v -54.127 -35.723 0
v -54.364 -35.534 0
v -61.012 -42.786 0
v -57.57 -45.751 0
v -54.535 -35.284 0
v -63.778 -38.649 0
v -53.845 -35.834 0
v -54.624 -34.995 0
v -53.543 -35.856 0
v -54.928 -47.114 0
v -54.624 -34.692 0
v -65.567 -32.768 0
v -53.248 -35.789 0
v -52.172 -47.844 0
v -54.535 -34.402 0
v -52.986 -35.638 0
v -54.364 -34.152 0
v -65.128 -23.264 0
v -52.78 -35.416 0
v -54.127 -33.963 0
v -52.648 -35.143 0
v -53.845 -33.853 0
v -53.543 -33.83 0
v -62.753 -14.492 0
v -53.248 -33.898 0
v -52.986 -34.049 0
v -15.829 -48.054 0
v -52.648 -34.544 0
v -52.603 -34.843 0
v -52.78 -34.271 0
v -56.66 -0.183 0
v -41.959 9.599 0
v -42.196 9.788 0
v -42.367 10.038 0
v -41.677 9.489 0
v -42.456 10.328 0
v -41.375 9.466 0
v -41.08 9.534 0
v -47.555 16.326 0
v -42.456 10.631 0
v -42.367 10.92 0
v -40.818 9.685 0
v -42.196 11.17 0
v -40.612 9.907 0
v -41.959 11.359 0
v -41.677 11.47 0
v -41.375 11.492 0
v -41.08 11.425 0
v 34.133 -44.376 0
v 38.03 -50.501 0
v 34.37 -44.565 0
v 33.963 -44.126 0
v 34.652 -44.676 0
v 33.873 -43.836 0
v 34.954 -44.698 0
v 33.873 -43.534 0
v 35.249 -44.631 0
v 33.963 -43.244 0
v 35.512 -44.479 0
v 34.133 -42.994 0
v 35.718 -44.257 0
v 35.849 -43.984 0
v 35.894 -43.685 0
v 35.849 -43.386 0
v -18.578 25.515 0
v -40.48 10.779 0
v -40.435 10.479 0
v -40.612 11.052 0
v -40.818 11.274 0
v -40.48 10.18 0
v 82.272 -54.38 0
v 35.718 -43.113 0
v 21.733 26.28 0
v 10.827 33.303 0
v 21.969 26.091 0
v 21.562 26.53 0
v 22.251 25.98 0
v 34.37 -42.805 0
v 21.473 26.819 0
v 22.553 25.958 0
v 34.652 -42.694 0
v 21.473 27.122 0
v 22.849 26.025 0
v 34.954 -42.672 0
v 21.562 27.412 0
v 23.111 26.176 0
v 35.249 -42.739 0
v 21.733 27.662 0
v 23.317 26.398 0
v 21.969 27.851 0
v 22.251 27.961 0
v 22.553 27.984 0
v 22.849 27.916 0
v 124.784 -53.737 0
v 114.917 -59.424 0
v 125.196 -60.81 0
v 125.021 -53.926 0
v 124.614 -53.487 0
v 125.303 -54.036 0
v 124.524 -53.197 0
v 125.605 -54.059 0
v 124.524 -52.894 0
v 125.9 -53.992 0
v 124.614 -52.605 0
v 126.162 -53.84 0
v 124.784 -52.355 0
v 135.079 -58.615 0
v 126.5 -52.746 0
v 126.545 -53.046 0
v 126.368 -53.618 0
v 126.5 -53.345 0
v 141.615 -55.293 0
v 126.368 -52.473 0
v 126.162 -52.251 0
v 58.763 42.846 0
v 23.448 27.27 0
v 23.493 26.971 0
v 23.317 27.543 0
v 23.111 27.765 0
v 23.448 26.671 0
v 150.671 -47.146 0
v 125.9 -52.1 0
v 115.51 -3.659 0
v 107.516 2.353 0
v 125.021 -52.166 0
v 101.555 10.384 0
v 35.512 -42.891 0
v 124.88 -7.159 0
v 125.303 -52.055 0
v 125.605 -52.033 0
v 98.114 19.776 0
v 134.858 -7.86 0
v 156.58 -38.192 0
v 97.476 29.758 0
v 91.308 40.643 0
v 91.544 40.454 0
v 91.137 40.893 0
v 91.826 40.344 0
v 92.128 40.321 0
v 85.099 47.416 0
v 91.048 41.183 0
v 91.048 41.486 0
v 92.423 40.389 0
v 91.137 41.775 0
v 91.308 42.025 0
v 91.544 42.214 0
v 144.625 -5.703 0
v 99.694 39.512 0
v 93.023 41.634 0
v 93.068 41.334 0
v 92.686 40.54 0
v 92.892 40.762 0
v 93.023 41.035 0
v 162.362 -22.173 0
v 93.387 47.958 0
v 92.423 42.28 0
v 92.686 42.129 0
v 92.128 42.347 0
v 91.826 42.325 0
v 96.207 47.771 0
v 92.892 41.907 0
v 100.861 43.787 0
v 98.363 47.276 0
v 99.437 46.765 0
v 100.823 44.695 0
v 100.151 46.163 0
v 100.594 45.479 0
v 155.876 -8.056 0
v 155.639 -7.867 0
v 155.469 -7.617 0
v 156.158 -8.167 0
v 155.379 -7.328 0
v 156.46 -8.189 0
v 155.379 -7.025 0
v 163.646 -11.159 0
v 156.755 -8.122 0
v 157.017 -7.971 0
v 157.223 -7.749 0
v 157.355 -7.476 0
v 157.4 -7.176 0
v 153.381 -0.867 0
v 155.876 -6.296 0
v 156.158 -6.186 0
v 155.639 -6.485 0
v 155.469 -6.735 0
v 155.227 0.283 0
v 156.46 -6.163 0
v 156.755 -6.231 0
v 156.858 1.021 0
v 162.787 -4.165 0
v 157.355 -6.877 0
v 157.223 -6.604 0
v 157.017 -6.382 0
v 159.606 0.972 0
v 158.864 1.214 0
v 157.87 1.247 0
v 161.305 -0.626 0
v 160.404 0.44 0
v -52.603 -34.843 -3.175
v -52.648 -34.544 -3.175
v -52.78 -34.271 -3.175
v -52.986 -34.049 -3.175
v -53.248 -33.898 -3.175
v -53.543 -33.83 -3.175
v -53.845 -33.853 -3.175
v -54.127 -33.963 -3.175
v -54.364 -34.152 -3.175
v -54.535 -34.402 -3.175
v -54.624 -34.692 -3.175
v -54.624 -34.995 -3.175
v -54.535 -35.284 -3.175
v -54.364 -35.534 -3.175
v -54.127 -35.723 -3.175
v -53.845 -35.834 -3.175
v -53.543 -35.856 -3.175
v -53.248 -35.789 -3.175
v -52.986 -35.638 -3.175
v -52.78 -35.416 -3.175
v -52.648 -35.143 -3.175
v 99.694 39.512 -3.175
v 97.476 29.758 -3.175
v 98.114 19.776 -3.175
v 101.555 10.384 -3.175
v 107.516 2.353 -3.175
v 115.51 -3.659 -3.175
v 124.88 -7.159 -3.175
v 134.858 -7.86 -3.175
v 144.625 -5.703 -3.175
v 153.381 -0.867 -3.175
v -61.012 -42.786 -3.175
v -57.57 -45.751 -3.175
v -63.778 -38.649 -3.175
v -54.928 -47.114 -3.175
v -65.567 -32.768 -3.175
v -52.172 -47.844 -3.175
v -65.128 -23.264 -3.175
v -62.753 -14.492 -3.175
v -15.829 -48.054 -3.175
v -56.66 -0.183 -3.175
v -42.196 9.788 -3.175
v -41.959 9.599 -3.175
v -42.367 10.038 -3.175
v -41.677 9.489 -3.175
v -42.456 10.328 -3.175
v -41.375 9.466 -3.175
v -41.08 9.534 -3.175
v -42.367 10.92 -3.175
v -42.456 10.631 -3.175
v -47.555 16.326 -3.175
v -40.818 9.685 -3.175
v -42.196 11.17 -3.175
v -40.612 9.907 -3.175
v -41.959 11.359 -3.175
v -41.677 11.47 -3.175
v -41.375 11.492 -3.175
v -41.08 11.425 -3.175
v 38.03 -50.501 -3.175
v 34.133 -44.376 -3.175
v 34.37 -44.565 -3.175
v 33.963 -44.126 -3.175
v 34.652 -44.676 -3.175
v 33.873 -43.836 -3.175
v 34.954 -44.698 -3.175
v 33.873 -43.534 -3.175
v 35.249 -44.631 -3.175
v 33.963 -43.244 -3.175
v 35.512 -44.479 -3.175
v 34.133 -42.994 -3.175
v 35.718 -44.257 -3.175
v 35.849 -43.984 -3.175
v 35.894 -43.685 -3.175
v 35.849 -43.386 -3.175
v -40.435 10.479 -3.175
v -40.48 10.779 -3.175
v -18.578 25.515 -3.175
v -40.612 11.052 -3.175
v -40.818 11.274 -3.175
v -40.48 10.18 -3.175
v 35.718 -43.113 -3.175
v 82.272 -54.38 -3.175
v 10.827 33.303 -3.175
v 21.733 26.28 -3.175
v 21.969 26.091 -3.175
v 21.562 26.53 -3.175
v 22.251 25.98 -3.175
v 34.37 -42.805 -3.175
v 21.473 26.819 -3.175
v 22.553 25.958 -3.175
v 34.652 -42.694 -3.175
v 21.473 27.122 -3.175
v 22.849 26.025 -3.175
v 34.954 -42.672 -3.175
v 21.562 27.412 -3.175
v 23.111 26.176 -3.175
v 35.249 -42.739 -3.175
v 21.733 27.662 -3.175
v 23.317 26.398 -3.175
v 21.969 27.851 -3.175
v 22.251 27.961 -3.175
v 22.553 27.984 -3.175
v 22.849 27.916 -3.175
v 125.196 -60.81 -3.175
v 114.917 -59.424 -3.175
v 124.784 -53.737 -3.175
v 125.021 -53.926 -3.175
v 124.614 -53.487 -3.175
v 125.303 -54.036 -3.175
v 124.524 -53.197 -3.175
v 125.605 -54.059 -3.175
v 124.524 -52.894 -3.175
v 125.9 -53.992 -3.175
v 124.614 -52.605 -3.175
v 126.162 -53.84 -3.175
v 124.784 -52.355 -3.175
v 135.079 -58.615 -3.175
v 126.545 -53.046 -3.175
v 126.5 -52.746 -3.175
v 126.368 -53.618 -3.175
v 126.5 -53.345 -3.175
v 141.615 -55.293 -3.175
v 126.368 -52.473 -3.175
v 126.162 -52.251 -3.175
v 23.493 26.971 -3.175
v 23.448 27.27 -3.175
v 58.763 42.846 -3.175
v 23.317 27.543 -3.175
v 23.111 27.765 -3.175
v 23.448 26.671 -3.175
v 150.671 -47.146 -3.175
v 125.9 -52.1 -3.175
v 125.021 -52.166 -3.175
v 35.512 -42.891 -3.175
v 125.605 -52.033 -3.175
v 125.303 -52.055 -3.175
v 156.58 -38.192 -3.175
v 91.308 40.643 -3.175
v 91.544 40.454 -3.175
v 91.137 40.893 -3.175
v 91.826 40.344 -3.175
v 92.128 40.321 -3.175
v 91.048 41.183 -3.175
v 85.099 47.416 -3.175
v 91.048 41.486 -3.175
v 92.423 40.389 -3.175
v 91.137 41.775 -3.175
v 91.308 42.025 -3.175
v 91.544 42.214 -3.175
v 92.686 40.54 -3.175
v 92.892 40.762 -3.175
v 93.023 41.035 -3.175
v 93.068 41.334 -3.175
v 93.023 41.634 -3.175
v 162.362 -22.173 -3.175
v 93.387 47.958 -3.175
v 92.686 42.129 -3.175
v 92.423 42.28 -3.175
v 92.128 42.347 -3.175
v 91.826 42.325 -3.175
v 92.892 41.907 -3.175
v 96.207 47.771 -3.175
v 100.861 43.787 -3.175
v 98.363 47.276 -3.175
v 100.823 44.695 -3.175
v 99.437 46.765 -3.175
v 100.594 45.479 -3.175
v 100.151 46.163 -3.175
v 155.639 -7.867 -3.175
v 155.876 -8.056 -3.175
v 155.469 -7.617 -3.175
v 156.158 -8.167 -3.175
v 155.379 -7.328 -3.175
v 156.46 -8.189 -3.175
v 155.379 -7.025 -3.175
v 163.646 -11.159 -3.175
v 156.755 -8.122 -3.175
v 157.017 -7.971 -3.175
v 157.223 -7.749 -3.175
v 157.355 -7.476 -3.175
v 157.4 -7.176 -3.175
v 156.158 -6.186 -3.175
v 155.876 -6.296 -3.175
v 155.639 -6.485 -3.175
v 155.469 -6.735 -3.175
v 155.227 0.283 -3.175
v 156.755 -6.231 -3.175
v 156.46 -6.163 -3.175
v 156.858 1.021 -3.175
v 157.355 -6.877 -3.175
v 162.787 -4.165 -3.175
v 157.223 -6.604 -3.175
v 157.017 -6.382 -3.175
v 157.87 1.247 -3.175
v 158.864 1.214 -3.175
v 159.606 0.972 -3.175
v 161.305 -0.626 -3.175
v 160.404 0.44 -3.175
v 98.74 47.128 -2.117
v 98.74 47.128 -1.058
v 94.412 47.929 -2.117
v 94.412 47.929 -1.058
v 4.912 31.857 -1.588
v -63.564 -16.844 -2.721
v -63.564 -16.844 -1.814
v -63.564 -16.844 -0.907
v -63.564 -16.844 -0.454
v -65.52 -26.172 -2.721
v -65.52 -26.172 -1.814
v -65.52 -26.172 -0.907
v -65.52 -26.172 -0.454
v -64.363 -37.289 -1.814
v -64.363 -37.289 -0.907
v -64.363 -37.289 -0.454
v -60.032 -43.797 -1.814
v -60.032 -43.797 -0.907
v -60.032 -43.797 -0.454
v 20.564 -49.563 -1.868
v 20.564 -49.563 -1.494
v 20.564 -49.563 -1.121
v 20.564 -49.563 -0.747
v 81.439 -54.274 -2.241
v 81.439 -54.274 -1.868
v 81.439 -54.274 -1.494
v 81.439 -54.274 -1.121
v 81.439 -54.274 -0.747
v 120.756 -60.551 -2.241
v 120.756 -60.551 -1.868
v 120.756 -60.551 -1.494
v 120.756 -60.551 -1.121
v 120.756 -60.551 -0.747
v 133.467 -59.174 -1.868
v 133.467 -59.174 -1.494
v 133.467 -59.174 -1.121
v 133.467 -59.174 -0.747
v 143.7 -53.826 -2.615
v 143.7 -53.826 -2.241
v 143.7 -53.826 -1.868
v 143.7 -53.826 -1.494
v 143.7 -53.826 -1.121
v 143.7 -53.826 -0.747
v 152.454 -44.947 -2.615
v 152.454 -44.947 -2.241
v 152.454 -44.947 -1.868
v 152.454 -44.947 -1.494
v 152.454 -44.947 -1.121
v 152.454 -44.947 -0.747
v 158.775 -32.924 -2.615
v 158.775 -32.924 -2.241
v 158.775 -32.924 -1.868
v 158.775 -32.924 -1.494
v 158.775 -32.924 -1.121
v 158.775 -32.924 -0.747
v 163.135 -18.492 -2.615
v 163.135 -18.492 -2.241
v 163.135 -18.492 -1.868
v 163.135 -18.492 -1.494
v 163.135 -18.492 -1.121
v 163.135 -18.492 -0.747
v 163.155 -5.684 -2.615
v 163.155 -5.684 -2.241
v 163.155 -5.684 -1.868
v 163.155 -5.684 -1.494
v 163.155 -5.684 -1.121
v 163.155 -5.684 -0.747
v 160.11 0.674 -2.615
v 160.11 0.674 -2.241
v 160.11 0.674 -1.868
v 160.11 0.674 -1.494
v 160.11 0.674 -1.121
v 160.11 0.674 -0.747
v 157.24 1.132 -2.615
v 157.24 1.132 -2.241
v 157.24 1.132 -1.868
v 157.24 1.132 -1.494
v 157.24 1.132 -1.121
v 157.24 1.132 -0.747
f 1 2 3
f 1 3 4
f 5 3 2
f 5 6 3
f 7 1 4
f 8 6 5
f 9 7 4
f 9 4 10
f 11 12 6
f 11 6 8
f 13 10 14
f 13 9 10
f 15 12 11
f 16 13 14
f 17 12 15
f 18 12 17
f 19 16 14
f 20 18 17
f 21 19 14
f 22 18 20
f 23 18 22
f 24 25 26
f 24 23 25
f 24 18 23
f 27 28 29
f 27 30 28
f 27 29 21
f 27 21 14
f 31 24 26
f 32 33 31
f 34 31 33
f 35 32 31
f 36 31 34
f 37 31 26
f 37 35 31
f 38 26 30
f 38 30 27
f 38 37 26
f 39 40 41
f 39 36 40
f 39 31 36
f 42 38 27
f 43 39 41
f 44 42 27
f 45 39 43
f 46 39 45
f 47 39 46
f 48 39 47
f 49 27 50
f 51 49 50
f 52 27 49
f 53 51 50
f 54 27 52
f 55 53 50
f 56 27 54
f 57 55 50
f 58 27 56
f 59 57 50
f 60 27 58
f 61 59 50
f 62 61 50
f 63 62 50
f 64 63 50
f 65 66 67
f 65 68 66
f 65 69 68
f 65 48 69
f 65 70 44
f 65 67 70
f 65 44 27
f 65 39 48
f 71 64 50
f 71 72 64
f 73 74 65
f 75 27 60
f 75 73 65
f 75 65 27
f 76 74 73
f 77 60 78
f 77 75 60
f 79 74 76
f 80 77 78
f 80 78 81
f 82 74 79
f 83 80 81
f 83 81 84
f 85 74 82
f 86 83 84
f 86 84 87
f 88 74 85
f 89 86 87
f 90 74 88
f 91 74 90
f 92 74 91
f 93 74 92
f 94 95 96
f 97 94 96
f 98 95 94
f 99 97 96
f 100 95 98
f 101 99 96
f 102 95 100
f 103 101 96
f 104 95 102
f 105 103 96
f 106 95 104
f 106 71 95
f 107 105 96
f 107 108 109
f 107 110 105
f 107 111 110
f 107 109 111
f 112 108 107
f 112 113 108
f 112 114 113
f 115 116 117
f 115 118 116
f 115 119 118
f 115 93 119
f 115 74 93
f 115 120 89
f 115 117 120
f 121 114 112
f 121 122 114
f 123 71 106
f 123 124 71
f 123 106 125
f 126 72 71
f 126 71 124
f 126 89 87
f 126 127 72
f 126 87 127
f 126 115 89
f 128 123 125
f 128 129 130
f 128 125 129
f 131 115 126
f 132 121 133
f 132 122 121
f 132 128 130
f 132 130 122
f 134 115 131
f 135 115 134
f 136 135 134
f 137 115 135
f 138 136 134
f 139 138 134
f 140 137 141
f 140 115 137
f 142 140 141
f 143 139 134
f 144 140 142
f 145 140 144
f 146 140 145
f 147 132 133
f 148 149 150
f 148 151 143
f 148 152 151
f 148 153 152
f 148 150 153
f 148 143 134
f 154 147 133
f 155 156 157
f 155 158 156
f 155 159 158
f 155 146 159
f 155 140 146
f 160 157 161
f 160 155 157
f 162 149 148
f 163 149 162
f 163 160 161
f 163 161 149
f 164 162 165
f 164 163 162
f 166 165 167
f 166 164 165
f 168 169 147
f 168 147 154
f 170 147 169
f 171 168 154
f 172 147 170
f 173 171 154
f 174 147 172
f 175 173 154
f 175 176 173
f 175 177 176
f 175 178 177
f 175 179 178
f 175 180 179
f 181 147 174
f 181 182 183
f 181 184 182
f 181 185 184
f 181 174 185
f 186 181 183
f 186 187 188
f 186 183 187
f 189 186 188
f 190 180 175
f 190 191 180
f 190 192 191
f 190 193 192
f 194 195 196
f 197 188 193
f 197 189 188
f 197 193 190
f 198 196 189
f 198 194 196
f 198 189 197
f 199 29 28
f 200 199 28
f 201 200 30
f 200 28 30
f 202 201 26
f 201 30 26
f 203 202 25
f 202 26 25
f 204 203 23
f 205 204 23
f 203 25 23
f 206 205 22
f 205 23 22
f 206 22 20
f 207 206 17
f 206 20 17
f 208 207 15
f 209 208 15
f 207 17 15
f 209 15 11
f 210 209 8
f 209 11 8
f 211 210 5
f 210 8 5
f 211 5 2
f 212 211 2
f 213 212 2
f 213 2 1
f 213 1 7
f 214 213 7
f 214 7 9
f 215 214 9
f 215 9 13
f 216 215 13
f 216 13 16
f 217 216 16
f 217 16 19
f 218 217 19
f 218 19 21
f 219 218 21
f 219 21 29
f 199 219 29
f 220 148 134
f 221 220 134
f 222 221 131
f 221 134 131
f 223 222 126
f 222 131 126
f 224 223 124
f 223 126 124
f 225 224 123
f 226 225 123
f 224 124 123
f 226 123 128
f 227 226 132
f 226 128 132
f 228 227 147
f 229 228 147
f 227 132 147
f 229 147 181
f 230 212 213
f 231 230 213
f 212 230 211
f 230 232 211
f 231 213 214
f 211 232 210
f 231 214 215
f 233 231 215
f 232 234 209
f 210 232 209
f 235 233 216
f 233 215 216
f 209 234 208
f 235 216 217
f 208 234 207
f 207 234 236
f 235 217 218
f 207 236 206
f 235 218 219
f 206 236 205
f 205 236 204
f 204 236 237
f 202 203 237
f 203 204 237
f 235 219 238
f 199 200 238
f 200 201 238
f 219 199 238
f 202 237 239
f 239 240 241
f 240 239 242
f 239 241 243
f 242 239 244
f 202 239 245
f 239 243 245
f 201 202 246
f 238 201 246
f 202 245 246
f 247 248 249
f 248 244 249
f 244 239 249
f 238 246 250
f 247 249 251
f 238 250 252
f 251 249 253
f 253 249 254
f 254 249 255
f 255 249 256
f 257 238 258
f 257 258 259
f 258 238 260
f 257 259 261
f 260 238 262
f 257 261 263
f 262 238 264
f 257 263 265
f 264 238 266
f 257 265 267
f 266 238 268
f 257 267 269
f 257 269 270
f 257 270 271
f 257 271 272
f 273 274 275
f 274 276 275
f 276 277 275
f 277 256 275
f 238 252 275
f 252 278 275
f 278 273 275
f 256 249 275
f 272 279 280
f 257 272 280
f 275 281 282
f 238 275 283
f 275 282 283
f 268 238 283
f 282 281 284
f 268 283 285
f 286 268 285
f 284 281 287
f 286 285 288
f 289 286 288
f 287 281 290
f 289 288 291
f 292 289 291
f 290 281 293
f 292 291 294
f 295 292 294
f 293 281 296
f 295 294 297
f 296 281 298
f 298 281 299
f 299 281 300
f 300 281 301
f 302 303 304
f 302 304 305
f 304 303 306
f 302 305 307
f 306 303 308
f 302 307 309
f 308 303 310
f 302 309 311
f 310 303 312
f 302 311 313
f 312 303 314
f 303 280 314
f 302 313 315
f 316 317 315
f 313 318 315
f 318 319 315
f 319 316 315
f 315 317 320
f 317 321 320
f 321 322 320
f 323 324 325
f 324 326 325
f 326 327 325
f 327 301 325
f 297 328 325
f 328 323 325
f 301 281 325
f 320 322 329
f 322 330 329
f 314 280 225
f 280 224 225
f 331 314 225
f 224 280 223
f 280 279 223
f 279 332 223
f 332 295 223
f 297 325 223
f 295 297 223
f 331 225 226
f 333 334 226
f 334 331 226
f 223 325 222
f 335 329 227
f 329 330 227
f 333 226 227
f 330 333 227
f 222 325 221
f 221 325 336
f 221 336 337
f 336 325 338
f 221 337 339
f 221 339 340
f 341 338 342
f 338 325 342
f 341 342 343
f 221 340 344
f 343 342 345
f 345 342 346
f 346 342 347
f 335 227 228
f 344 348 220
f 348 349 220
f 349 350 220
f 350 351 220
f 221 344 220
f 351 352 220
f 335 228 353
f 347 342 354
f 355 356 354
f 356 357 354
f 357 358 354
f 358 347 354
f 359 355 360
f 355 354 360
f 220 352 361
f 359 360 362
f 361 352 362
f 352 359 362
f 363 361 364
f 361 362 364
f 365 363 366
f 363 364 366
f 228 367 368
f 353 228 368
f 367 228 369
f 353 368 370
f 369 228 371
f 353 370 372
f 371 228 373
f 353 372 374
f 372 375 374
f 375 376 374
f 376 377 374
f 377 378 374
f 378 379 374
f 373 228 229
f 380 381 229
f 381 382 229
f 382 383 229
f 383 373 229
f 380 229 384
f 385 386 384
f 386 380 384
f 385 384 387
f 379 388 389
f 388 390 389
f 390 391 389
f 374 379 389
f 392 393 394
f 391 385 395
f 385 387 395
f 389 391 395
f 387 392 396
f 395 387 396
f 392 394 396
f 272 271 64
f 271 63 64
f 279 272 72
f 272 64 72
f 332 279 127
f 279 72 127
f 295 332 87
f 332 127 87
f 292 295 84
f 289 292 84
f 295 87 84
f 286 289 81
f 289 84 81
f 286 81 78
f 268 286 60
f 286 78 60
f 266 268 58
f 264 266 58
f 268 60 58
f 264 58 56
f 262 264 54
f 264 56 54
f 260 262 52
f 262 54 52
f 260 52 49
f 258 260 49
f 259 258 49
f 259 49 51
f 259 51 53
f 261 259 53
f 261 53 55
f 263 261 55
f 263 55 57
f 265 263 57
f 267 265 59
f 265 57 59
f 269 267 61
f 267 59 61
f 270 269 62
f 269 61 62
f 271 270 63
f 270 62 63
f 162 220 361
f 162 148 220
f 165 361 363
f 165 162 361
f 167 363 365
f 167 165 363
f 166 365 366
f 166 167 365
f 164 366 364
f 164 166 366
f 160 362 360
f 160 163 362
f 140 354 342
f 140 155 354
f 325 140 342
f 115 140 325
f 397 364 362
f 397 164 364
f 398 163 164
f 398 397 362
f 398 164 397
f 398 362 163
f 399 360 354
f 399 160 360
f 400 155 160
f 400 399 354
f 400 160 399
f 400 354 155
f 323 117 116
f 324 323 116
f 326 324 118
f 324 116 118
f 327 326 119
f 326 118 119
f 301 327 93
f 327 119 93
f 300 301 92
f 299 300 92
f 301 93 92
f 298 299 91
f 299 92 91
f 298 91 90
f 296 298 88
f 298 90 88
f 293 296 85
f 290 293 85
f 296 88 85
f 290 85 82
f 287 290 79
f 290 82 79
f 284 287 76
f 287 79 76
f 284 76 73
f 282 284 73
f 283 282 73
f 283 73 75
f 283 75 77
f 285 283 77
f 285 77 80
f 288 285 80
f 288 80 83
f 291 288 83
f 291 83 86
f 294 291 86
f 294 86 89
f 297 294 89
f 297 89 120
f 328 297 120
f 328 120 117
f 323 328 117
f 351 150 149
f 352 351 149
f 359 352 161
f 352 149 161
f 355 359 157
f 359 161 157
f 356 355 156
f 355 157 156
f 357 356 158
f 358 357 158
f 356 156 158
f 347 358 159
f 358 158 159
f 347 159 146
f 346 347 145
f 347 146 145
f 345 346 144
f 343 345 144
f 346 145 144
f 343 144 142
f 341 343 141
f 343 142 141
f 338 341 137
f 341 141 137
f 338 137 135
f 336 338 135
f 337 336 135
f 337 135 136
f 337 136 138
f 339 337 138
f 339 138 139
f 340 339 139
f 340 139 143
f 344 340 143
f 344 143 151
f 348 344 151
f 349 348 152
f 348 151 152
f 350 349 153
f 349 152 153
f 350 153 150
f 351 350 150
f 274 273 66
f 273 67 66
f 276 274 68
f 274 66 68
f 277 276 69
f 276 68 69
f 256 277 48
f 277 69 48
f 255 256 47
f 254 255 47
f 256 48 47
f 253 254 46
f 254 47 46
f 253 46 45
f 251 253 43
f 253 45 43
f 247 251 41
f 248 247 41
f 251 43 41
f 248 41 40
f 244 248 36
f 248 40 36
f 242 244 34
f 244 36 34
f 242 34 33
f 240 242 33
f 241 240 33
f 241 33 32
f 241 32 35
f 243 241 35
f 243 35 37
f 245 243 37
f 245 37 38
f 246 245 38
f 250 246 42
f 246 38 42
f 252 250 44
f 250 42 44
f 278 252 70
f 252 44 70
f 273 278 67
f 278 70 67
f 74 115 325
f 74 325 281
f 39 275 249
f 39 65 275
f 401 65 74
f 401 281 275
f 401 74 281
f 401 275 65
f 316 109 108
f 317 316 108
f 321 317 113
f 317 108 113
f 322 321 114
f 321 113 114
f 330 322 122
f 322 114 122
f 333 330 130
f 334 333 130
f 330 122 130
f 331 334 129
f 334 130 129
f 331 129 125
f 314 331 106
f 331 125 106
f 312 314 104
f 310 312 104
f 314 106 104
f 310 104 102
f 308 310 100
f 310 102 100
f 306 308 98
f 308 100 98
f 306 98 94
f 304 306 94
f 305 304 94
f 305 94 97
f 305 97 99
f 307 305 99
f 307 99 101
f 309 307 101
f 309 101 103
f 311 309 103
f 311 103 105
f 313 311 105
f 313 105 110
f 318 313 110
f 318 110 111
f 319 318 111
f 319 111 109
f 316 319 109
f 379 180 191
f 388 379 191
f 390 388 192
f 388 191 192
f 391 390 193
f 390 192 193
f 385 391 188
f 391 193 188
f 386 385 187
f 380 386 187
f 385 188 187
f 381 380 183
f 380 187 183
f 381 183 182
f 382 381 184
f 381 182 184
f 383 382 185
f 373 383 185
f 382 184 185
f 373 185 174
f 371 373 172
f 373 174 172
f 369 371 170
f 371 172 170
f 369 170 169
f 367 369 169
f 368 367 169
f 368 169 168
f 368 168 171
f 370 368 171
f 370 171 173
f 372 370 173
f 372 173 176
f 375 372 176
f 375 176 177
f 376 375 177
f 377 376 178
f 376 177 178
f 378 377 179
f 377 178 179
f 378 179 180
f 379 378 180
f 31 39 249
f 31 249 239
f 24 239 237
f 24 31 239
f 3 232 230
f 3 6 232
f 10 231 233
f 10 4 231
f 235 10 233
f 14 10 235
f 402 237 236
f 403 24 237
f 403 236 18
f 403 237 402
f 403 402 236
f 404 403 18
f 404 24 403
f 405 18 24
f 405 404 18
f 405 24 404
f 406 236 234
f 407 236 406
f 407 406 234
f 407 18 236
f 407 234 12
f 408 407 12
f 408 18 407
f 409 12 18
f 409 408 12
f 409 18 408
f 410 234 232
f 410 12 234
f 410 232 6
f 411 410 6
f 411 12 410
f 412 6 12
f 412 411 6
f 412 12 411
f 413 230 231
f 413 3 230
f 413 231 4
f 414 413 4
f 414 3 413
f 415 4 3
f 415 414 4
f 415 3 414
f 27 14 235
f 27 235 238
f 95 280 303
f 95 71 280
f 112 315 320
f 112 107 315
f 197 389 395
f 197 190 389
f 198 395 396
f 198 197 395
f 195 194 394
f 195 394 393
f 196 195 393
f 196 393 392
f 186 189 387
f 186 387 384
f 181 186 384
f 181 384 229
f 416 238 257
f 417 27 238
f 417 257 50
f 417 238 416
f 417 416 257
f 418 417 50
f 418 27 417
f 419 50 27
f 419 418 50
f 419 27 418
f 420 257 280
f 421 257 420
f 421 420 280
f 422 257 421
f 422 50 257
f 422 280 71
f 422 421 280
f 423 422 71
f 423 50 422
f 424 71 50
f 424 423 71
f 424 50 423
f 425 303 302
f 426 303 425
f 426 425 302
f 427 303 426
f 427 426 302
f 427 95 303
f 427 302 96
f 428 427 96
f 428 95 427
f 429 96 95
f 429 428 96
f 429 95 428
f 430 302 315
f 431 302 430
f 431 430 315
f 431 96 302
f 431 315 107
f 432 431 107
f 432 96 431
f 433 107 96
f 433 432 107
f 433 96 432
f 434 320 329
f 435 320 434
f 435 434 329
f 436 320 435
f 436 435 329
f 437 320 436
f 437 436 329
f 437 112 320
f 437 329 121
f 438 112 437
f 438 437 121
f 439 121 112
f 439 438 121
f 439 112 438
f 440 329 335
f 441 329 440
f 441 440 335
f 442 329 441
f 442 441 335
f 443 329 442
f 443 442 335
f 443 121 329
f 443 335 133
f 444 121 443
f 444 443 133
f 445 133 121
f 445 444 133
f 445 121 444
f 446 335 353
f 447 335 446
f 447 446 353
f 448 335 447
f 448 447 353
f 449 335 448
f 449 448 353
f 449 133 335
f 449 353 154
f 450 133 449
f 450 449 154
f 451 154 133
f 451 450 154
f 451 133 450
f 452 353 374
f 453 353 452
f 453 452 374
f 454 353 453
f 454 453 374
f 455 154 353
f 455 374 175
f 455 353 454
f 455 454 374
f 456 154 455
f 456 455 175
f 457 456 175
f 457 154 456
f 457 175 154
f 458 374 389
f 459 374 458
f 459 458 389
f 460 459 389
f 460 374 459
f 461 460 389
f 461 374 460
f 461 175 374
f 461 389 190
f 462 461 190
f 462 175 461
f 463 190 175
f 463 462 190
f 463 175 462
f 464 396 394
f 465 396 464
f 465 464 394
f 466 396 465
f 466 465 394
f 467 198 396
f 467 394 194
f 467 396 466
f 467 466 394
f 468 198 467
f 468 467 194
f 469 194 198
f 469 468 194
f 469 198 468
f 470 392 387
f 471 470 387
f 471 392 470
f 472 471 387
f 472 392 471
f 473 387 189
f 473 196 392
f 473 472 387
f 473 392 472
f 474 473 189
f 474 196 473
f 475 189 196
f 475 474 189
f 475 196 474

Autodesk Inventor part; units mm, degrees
ref_plane "YZ Plane" through (0, 0, 0) normal (1, 0, 0) x (0, 1, 0)
ref_plane "XZ Plane" through (0, 0, 0) normal (0, 1, 0) x (-1, 0, 0)
ref_plane "XY Plane" through (0, 0, 0) normal (0, 0, 1) x (1, 0, 0)
sketch "Sketch1" plane through (0, 0, 0) normal (0, 0, 1) x (1, 0, 0)
  circle A0 centre (22.4774, 26.9707) radius 1.5875 construction
  circle A1 centre (125.529, -53.0458) radius 1.5875 construction
  circle A2 centre (-41.4513, 10.4793) radius 1.5875 construction
  circle A3 centre (-53.6193, -34.8433) radius 1.5875 construction
  circle A4 centre (92.0523, 41.3343) radius 1.5875 construction
  circle A5 centre (156.384, -7.2553) radius 1.5875 construction
  circle A6 centre (34.8781, -43.685) radius 1.5875 construction
  spline S0 degree 4 poles (-47.5552, 16.3255) (-56.6287, 2.113) (-58.2297, -5.7038) (-64.6, -14.5986) (-66.079, -30.6977) (-65.3382, -34.7532) (-63.7847, -39.1481) (-60.7246, -43.61) (-57.2762, -46.3652) (-54.2619, -47.5537) (-52.1718, -47.8438) knots 0 0 0 0 0 0.364781 0.475074 0.575005 0.66288 0.74023 0.816344 1 1 1 1 1
  spline S1 degree 2 poles (58.7626, 42.8458) (4.2199, 34.129) (-47.5552, 16.3255) knots 0 0 0 1 1 1
  spline S2 degree 4 poles (99.6942, 39.5117) (100.5318, 41.9331) (102.2763, 45.9453) (95.6139, 49.3748) (84.6716, 47.1993) (75.6927, 46.6375) (58.7626, 42.8458) knots 0 0 0 0 0 0.302268 0.437081 1 1 1 1 1
  arc A7 (99.6942, 39.5117) -> (153.3806, -0.867) centre (132.2899, 26.9707) ccw
  spline S3 degree 4 poles (-52.1718, -47.8438) (-36.534, -47.2807) (-10.4713, -48.0839) (24.7022, -49.5616) (67.224, -52.2682) (90.8103, -55.4618) (116.0621, -59.11) (123.6332, -61.9611) (134.6518, -59.1205) (140.3655, -56.3824) (147.0585, -51.5689) (152.6758, -44.8659) (156.5759, -39.5192) (161.1474, -26.3914) (163.713, -18.7298) (163.8259, -8.1408) (162.8831, -4.127) (161.1298, 0.7169) (158.3923, 2.1696) (155.7665, 0.7307) (153.3806, -0.867) knots 0 0 0 0 0 0.199945 0.282515 0.361523 0.429863 0.488286 0.53653 0.578018 0.619244 0.659617 0.703918 0.750179 0.797252 0.841669 0.879198 0.910002 0.934908 1 1 1 1 1
  circle A8 centre (-41.4513, 10.4793) radius 1.016
  circle A9 centre (22.4774, 26.9707) radius 1.016
  circle A10 centre (92.0523, 41.3343) radius 1.016
  circle A11 centre (156.384, -7.1763) radius 1.016
  circle A12 centre (125.529, -53.0458) radius 1.016
  circle A13 centre (34.8781, -43.685) radius 1.016
  circle A14 centre (-53.6193, -34.8433) radius 1.016
  point P0 (-58.1503, -3.4556)
  point P1 (-61.848, -12.1317)
  point P2 (-64.9126, -22.073)
  point P3 (-65.6993, -31.3231)
  point P4 (-64.9927, -35.4369)
  point P5 (-63.5229, -39.1631)
  point P6 (-61.3341, -42.4183)
  point P7 (-58.5466, -45.0642)
  point P8 (-55.3853, -46.9262)
  point P9 (4.7943, 31.828)
  point P10 (100.8602, 43.7772)
  point P11 (100.1647, 46.1477)
  point P12 (97.4566, 47.5413)
  point P13 (92.3454, 47.9534)
  point P14 (84.3053, 47.3258)
  point P15 (-26.9279, -47.7688)
  point P16 (3.8331, -48.7884)
  point P17 (37.2041, -50.4527)
  point P18 (68.9139, -52.8419)
  point P19 (96.8666, -56.3799)
  point P20 (117.5981, -59.9718)
  point P21 (125.9835, -60.7611)
  point P22 (134.5495, -58.8078)
  point P23 (140.4841, -56.0058)
  point P24 (146.5962, -51.4173)
  point P25 (152.0147, -45.51)
  point P26 (156.0745, -39.2339)
  point P27 (160.8814, -27.0309)
  point P28 (163.3992, -16.4807)
  point P29 (163.3984, -7.1763)
  point P30 (162.4893, -3.2093)
  point P31 (161.1529, -0.4019)
  point P32 (159.493, 1.023)
  point P33 (157.3678, 1.1626)
  dimension "d2" = 2.032
  dimension "d3" = 2.032
  dimension "d4" = 2.032
  dimension "d5" = 2.032
  dimension "d6" = 2.032
  dimension "d7" = 2.032
  dimension "d8" = 2.032
extrude "Extrusion1" add sketch "Sketch1" against normal blind 3.175
properties part number "mountingBase02" material "Wood (Cherry)"
